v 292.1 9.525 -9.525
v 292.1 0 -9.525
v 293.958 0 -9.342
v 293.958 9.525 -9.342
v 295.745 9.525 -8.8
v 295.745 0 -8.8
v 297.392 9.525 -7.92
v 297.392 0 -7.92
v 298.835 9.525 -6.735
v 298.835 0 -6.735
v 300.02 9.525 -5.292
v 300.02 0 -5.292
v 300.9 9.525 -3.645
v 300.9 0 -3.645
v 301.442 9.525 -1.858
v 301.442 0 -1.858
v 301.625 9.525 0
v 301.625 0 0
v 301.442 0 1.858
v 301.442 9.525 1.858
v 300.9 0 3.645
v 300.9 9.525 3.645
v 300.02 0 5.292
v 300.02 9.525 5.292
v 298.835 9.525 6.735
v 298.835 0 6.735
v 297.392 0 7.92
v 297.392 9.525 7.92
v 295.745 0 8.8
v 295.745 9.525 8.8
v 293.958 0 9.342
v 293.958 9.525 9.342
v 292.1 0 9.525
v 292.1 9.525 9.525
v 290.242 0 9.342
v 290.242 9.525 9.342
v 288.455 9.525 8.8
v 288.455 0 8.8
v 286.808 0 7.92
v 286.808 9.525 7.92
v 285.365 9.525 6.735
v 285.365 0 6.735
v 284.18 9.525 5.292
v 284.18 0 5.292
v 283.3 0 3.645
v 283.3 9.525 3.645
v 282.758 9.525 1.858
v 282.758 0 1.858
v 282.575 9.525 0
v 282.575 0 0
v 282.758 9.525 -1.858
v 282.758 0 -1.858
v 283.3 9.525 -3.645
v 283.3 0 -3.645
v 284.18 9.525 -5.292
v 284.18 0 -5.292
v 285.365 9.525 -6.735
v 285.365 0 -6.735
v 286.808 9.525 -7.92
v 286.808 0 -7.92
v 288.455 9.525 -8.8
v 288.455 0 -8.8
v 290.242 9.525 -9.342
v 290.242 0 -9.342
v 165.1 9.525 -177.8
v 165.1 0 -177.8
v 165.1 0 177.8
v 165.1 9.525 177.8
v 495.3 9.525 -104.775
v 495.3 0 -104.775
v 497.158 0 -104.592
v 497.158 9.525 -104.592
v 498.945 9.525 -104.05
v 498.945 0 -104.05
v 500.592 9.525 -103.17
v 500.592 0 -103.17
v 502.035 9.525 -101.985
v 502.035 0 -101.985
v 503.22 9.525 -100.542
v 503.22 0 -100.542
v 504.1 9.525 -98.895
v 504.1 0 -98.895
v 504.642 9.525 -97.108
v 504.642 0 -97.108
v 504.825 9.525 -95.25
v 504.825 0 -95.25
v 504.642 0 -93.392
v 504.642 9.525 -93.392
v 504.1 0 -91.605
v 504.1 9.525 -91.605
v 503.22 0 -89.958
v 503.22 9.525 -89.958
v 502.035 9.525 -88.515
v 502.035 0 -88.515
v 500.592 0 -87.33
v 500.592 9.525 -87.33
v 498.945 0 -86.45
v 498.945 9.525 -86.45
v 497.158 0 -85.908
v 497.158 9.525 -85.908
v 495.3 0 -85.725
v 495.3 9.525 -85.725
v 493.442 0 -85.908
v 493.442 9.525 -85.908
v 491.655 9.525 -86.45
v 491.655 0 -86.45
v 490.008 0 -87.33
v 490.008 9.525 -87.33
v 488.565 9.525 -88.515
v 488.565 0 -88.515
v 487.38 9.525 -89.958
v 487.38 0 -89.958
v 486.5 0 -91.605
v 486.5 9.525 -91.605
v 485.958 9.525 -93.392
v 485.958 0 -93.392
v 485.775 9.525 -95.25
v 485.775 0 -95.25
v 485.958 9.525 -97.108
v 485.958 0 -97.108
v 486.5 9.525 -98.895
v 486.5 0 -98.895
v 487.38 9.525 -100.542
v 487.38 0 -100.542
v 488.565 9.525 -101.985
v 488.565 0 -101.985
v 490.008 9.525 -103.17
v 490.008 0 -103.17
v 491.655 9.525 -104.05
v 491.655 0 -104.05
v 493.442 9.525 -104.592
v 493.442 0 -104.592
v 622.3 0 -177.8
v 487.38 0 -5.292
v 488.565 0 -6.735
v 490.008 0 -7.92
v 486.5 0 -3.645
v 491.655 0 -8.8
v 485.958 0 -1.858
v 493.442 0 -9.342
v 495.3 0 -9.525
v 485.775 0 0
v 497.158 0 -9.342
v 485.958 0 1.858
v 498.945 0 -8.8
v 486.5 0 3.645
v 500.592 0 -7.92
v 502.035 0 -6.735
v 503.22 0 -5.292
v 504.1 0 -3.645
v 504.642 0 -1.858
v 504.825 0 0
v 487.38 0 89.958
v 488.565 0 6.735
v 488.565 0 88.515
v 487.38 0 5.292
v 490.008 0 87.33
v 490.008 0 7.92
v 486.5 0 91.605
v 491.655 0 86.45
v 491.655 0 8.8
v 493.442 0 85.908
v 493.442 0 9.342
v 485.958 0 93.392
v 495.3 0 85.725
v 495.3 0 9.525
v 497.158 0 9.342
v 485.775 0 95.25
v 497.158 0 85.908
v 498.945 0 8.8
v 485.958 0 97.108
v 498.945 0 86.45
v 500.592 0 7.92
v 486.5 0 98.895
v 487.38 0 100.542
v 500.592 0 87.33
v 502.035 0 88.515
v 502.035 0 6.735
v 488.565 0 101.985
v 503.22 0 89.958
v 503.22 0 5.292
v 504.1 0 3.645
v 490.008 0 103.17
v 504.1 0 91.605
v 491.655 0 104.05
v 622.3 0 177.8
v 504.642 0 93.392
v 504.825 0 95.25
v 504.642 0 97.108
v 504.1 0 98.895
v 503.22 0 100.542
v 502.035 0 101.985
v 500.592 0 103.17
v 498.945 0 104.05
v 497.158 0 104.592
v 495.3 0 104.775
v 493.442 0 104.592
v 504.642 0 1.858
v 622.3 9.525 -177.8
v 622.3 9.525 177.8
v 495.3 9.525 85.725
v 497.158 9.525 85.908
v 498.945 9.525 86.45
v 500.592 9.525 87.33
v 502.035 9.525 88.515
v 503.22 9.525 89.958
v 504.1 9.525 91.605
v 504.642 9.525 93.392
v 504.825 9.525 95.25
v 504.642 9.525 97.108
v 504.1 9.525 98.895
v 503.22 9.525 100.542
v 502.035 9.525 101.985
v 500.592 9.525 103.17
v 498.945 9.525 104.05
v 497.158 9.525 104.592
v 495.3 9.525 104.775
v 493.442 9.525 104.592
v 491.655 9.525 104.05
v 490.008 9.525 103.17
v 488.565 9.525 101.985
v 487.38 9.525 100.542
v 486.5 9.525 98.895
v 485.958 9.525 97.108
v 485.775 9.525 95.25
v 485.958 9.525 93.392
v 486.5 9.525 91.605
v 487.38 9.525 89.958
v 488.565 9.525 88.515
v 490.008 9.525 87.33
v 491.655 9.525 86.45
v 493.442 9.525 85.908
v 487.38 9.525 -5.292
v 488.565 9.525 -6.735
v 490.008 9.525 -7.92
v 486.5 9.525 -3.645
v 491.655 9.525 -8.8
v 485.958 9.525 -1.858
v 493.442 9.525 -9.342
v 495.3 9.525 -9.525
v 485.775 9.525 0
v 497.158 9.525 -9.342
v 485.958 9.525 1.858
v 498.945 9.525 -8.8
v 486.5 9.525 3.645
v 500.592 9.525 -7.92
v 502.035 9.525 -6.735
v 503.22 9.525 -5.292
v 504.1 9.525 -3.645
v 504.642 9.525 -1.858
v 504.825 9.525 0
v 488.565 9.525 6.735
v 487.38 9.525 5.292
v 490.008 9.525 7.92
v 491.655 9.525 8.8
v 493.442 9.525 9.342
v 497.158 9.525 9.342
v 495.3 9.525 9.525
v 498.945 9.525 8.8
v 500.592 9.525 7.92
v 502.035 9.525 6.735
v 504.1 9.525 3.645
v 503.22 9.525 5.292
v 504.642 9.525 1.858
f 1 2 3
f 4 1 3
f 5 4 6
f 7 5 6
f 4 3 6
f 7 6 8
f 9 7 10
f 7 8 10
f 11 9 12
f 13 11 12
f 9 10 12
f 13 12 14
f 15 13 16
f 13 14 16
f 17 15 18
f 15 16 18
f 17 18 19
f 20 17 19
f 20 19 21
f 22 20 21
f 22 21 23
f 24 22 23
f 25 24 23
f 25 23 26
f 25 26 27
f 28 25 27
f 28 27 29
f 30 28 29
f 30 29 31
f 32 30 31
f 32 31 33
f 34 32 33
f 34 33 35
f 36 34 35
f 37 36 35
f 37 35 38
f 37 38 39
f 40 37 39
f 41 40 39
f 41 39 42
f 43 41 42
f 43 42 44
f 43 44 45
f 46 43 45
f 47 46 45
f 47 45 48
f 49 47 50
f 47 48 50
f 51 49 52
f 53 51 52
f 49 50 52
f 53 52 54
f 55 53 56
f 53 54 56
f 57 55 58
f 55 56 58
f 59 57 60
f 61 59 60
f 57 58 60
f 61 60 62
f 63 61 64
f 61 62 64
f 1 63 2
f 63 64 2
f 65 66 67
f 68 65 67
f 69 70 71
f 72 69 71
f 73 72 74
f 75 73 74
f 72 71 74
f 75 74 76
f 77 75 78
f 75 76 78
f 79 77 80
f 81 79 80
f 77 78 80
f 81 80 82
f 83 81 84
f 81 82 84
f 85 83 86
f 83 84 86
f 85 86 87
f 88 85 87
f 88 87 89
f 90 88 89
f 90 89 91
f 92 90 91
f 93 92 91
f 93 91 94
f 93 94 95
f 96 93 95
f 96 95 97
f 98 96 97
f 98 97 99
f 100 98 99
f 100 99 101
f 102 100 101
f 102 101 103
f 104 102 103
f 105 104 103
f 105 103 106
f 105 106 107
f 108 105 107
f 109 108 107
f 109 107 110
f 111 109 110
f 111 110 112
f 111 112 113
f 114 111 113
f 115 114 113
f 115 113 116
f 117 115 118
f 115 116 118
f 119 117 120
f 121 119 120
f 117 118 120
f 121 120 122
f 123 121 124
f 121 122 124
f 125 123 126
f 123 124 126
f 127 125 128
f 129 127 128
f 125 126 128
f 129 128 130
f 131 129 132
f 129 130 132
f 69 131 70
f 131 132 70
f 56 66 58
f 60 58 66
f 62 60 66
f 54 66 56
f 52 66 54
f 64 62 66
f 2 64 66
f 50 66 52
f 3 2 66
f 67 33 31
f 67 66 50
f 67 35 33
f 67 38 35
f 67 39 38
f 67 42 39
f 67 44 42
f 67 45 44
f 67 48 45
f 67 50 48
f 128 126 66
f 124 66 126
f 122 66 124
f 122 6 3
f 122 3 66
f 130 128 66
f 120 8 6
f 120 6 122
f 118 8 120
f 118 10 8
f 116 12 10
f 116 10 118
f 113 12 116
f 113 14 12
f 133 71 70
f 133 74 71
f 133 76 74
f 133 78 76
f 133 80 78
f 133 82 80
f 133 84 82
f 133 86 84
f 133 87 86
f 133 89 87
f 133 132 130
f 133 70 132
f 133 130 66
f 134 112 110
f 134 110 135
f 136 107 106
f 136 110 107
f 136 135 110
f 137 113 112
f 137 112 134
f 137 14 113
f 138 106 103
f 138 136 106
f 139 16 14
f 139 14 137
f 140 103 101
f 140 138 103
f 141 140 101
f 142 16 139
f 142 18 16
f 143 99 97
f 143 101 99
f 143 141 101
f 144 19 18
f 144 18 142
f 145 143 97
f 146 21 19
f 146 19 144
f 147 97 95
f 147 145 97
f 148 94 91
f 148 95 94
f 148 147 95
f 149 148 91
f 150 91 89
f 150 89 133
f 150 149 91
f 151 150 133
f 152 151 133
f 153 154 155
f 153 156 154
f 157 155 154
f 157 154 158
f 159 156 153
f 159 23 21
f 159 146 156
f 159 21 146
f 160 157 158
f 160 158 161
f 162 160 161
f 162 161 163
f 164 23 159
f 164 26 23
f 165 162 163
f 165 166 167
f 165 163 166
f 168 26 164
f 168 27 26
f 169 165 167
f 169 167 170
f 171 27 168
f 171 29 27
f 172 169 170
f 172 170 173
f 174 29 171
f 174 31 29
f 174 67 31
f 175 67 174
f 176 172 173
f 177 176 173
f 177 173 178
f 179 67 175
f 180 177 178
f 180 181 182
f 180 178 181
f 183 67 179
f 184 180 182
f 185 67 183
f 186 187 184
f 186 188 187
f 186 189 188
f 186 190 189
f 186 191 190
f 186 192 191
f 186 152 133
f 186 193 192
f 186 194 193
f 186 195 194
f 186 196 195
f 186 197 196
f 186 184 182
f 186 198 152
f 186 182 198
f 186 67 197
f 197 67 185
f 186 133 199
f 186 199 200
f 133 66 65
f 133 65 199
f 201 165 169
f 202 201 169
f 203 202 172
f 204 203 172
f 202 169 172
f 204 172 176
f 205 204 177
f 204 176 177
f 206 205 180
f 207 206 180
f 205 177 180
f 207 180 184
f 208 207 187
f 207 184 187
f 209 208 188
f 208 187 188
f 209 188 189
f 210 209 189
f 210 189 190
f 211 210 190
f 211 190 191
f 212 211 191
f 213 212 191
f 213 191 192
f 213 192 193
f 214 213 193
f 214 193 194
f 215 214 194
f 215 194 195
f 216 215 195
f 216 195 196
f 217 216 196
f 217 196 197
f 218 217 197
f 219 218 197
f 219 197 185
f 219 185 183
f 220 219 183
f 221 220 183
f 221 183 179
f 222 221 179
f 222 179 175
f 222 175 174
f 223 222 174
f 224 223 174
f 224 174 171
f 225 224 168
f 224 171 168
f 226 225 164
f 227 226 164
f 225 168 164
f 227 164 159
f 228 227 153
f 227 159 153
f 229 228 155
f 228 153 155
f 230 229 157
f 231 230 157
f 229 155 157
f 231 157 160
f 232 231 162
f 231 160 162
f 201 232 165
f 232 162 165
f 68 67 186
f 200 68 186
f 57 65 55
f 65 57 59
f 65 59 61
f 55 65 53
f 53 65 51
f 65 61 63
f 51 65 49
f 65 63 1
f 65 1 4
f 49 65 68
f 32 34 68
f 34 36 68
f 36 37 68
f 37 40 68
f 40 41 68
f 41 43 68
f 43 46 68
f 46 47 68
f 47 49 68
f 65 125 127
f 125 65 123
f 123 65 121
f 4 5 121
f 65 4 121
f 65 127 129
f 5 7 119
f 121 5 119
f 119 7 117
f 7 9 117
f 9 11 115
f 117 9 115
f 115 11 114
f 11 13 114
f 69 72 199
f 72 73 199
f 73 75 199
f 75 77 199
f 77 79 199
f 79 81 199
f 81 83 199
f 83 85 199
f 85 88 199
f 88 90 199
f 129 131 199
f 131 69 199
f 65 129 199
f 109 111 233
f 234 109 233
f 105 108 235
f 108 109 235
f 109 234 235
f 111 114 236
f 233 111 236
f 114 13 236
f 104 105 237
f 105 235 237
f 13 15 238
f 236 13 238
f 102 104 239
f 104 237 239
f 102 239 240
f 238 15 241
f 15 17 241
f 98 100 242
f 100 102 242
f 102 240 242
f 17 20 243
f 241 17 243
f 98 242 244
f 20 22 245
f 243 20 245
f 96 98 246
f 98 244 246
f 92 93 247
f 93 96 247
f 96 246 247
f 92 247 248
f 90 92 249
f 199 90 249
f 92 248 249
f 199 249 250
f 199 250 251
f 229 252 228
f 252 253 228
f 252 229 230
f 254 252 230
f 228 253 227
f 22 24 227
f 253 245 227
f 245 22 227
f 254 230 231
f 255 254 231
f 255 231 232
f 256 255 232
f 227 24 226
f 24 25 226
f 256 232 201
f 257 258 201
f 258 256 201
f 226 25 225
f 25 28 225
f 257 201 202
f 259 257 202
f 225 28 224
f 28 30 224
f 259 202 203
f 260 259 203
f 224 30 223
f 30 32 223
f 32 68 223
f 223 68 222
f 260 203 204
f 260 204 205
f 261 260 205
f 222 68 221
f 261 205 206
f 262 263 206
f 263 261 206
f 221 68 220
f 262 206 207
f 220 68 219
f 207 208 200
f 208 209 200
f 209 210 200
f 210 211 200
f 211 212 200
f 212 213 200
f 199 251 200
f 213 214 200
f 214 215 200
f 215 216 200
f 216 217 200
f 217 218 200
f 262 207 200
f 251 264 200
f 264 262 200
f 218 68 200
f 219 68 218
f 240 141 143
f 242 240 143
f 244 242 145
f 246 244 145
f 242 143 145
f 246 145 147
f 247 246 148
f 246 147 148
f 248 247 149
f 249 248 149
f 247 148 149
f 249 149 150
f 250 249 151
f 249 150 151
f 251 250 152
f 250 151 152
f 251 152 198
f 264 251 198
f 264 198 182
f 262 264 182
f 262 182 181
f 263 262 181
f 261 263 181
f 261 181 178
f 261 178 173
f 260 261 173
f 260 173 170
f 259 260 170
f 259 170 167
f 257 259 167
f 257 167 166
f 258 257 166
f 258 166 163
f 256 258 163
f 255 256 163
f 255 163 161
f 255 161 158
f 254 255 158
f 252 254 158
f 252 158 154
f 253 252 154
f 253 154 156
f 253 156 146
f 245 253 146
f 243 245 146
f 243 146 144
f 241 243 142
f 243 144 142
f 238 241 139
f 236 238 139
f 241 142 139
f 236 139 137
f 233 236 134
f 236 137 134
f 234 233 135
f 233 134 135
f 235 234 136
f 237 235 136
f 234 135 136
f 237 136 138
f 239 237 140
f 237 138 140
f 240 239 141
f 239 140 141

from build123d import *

# Parameters (mm, degrees)
BOSS_EXTRUDE1_DEPTH = 9.525
BOSS_EXTRUDE2_DEPTH = 9.525
SKETCH4_W           = 63.5
SKETCH4_H           = 355.6
BOSS_EXTRUDE3_DEPTH = 9.525
SKETCH5_R           = 9.525
CUT_EXTRUDE1_DEPTH  = 648.271856043


with BuildPart() as part:
    # Sketch1 → Boss-Extrude1 (new body)
    with BuildSketch(Plane(origin=(0, 0, 0), x_dir=(1, 0, 0), z_dir=(0, 1, 0))):
        Polygon((461.512355724, 17.636671785), (558.8, 99.270698215), (558.8, 177.8), (228.6, 177.8), (228.6, -177.8), align=None)
    extrude(amount=BOSS_EXTRUDE1_DEPTH)

    # Sketch1<4> → Boss-Extrude2 (add)
    with BuildSketch(Plane(origin=(0, 0, 0), x_dir=(1, 0, 0), z_dir=(0, 1, 0))):
        Polygon((558.8, -177.8), (558.8, 99.270698215), (461.512355724, 17.636671785), (228.6, -177.8), align=None)
    extrude(amount=BOSS_EXTRUDE2_DEPTH)

    # Sketch4 → Boss-Extrude3 (add)
    with BuildSketch(Plane.XZ):
        with Locations((590.55, 0)):
            Rectangle(SKETCH4_W, SKETCH4_H)
        with Locations((196.85, 0)):
            Rectangle(SKETCH4_W, SKETCH4_H)
    extrude(amount=-BOSS_EXTRUDE3_DEPTH)

    # Sketch5 → Cut-Extrude1 (cut, through all)
    with BuildSketch(Plane.XZ):
        with Locations((495.3, -95.25)):
            Circle(SKETCH5_R)
        with Locations((495.3, 95.25)):
            Circle(SKETCH5_R)
        with Locations((292.1, 0)):
            Circle(SKETCH5_R)
        with Locations((495.3, 0)):
            Circle(SKETCH5_R)
    extrude(amount=-CUT_EXTRUDE1_DEPTH, mode=Mode.SUBTRACT)


solid = part.part
